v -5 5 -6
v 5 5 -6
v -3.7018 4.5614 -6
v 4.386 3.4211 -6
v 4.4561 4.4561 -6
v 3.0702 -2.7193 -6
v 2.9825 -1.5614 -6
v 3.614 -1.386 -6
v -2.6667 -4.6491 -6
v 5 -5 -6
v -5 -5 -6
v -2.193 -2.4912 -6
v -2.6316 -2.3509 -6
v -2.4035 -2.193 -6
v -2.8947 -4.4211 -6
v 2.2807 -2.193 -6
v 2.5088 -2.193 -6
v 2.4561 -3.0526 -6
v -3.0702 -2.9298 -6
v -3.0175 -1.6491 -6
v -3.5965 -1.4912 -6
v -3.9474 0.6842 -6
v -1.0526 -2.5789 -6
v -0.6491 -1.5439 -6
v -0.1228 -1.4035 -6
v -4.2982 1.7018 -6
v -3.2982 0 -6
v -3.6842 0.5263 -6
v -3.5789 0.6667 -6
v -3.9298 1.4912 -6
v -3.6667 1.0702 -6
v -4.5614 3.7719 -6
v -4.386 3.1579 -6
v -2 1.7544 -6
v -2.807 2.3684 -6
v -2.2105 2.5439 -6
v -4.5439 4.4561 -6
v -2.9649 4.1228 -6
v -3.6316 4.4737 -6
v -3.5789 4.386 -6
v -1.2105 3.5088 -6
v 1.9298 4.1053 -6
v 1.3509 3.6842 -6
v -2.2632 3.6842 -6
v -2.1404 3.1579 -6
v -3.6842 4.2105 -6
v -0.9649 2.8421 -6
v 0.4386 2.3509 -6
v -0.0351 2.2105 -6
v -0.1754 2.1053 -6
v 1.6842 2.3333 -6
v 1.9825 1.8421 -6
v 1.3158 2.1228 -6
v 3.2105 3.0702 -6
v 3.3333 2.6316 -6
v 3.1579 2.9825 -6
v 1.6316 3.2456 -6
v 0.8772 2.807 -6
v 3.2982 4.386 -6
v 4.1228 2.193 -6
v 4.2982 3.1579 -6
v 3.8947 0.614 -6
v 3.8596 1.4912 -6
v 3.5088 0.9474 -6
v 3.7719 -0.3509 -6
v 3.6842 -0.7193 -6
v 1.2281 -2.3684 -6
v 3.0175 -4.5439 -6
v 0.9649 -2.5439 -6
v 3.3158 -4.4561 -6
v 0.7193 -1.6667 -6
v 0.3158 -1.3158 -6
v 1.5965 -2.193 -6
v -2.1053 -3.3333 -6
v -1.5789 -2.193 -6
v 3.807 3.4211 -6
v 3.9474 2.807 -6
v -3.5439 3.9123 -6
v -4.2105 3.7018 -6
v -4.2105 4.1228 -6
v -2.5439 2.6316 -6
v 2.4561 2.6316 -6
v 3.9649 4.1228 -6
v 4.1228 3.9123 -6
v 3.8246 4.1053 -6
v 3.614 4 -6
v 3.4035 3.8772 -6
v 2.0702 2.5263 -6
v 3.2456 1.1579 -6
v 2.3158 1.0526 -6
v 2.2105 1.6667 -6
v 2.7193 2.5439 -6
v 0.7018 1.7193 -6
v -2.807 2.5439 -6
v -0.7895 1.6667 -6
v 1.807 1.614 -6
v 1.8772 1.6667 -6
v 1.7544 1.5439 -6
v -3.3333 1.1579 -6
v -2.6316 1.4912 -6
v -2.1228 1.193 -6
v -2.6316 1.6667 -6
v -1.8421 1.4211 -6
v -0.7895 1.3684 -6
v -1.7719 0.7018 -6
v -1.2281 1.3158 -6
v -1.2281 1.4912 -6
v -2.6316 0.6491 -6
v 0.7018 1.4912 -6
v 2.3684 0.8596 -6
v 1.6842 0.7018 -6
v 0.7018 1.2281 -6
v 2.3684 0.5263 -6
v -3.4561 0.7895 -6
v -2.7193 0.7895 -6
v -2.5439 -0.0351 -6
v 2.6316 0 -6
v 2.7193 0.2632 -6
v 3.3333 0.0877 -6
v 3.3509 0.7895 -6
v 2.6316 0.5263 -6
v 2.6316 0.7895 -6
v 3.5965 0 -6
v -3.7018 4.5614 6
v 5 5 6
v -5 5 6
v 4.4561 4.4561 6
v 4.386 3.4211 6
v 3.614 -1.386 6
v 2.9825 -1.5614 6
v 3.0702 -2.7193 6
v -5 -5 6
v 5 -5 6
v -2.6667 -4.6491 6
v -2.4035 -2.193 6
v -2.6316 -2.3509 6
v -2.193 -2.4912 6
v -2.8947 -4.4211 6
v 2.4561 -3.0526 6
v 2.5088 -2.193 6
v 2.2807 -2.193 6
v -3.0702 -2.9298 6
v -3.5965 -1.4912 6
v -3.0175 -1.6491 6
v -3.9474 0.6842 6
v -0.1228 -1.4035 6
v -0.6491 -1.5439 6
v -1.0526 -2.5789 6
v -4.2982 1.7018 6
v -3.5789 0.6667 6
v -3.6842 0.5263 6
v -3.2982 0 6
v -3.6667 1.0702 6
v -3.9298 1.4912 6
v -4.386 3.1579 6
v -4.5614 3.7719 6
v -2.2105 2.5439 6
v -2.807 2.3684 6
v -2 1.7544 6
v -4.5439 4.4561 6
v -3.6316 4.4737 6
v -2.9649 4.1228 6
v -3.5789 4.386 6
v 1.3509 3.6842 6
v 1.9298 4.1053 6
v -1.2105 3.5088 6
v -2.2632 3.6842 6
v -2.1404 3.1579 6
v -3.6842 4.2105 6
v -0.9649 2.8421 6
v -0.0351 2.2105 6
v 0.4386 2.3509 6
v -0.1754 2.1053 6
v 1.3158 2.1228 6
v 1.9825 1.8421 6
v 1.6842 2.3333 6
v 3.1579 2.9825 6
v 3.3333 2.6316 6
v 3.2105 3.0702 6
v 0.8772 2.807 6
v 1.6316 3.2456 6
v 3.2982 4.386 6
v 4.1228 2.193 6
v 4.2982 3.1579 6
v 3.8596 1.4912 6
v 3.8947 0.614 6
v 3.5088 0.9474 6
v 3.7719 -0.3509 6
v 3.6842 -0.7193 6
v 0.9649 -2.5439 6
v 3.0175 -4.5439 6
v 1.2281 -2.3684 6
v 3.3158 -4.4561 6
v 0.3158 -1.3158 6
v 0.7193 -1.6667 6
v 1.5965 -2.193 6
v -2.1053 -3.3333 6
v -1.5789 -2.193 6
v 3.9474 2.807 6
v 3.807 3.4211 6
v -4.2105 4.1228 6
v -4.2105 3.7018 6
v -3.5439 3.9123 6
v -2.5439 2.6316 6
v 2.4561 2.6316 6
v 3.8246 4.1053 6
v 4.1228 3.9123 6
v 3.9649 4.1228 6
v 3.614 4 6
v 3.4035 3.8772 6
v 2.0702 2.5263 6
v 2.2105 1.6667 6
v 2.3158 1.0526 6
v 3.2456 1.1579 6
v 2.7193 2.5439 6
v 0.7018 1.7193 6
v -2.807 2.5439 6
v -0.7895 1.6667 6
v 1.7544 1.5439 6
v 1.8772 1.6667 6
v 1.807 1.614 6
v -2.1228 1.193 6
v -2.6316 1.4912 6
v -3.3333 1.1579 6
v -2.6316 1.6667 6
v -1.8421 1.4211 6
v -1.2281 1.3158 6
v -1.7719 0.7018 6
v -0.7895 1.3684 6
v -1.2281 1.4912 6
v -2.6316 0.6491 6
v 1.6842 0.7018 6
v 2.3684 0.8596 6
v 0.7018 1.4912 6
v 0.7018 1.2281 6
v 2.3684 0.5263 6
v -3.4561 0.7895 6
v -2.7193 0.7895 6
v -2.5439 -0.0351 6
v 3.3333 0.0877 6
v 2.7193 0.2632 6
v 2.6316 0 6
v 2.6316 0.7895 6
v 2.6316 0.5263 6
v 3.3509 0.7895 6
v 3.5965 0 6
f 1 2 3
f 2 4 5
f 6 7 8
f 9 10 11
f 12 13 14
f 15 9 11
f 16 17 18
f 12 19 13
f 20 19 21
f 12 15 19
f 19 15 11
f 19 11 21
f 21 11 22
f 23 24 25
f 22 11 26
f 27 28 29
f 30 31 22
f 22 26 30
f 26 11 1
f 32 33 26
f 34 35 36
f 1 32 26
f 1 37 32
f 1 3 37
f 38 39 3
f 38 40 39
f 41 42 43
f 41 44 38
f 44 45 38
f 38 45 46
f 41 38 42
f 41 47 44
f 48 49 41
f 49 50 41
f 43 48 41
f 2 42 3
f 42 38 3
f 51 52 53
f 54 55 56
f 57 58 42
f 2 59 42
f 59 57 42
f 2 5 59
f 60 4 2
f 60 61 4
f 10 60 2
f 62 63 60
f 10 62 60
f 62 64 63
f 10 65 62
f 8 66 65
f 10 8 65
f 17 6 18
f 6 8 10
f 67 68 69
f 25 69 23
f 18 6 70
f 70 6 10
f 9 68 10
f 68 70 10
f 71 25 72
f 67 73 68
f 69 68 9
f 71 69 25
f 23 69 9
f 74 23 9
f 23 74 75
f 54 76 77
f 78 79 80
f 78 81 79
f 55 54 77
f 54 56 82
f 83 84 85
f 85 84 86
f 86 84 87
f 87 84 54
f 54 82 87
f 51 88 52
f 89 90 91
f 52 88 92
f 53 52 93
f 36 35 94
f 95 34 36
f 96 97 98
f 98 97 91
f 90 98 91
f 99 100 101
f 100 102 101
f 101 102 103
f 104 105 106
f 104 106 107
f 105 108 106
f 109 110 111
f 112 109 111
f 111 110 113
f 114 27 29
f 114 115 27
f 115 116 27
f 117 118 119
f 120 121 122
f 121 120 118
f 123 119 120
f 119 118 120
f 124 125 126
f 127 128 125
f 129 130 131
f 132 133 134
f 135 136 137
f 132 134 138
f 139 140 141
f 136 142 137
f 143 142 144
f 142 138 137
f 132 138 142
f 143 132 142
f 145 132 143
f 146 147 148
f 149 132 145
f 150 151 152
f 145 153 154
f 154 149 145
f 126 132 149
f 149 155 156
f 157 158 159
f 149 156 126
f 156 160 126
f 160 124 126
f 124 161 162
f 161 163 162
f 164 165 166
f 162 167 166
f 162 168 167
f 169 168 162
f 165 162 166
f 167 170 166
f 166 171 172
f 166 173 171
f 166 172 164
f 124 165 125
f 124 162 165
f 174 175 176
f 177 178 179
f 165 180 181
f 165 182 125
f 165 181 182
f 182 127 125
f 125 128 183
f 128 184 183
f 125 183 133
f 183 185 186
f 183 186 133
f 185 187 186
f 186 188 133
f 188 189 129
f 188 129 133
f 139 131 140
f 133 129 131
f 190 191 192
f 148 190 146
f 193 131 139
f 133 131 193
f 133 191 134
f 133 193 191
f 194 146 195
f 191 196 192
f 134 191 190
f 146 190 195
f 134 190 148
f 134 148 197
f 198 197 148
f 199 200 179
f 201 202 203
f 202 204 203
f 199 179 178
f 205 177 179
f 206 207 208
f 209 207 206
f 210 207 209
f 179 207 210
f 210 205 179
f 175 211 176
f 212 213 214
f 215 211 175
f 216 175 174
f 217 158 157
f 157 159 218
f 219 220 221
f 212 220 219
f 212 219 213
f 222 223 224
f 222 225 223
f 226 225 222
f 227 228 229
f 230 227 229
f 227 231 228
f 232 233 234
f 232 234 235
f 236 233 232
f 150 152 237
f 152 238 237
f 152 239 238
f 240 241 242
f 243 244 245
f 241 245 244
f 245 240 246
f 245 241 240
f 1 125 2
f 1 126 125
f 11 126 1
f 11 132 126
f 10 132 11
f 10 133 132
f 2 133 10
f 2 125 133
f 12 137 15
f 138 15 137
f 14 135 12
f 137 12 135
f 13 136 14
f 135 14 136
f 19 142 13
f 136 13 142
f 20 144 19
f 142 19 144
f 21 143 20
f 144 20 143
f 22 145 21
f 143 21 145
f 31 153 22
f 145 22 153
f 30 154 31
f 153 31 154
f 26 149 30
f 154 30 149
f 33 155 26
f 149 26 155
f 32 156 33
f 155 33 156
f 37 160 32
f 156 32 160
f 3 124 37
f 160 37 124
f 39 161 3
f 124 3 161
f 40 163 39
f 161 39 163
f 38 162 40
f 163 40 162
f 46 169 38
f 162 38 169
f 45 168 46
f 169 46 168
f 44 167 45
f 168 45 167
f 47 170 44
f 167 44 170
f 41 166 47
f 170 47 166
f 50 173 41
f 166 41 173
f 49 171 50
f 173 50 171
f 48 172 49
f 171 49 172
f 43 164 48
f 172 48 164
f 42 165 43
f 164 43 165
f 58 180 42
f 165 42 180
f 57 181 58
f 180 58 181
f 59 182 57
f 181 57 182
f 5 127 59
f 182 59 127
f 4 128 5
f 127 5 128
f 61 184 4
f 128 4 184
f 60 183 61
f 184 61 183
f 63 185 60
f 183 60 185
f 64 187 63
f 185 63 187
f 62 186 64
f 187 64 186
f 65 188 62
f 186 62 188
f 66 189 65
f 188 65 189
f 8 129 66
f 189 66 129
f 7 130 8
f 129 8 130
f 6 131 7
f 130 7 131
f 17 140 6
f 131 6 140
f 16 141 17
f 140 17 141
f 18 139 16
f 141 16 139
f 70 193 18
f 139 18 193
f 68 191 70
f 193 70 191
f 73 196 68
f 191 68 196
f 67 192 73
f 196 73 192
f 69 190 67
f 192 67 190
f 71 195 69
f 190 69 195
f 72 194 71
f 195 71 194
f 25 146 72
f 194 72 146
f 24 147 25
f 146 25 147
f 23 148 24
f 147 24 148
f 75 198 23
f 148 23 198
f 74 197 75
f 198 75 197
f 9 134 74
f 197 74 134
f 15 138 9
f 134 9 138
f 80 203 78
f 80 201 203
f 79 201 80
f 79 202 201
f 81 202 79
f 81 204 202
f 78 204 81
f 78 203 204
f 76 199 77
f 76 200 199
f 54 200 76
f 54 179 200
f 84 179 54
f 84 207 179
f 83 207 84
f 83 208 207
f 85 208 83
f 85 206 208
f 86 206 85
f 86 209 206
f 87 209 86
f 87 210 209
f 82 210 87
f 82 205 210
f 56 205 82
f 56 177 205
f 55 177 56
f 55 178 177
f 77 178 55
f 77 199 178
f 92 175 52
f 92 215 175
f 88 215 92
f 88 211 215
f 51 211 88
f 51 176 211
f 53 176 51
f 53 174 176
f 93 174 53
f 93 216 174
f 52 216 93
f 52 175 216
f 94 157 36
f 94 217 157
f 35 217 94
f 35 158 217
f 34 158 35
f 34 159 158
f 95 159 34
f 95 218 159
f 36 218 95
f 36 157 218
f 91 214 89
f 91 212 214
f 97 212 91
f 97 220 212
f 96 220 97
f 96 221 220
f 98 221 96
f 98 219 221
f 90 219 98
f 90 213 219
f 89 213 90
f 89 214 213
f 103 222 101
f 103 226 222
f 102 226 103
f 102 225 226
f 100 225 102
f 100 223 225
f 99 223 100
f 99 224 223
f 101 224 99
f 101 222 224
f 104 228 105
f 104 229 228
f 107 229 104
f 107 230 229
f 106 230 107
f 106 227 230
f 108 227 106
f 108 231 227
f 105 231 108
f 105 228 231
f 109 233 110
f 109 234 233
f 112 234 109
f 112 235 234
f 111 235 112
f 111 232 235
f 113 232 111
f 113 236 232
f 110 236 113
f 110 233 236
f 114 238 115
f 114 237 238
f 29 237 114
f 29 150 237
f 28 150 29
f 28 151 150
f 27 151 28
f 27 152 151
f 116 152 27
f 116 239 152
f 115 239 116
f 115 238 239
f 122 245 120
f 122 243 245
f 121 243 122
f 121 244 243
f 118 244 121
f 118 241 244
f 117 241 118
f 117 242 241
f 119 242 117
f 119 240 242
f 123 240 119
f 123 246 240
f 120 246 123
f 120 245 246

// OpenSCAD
module bflya_1()
{
 /* Generated by trace2scad version 20150415
    http://aggregate.org/MAKE/TRACE2SCAD/
    Optimized model has 5/9 original points
 */
 color([0.95, 0.95, 0.95])
 assign(minx=0) /* polygon minx=0 */
 assign(miny=0) /* polygon miny=0 */
 assign(maxx=20000) /* polygon maxx=20000 */
 assign(maxy=20000) /* polygon maxy=20000 */
 assign(dx=maxx-minx)
 assign(dy=maxy-miny)
 assign(maxd=((dx>dy)?dx:dy))
 scale([1/maxd, 1/maxd, 1])
 translate([-minx-dx/2, -miny-dy/2, 0])
 linear_extrude(height=1, convexity=5)
 union() {
  polygon([[0,10000],[0,0],[20000,0],[20000,20000],[0,20000]], convexity=5);
 }
}

module bflya_2()
{
 /* Generated by trace2scad version 20150415
    http://aggregate.org/MAKE/TRACE2SCAD/
    Optimized model has 5/9 original points
 */
 color([0.85, 0.85, 0.85])
 assign(minx=0) /* polygon minx=0 */
 assign(miny=0) /* polygon miny=0 */
 assign(maxx=20000) /* polygon maxx=20000 */
 assign(maxy=20000) /* polygon maxy=20000 */
 assign(dx=maxx-minx)
 assign(dy=maxy-miny)
 assign(maxd=((dx>dy)?dx:dy))
 scale([1/maxd, 1/maxd, 1])
 translate([-minx-dx/2, -miny-dy/2, 0])
 linear_extrude(height=1, convexity=5)
 union() {
  polygon([[0,10000],[0,0],[20000,0],[20000,20000],[0,20000]], convexity=5);
 }
}

module bflya_3()
{
 /* Generated by trace2scad version 20150415
    http://aggregate.org/MAKE/TRACE2SCAD/
    Optimized model has 5/9 original points
 */
 color([0.75, 0.75, 0.75])
 assign(minx=0) /* polygon minx=0 */
 assign(miny=0) /* polygon miny=0 */
 assign(maxx=20000) /* polygon maxx=20000 */
 assign(maxy=20000) /* polygon maxy=20000 */
 assign(dx=maxx-minx)
 assign(dy=maxy-miny)
 assign(maxd=((dx>dy)?dx:dy))
 scale([1/maxd, 1/maxd, 1])
 translate([-minx-dx/2, -miny-dy/2, 0])
 linear_extrude(height=1, convexity=5)
 union() {
  polygon([[0,10000],[0,0],[20000,0],[20000,20000],[0,20000]], convexity=5);
 }
}

module bflya_4()
{
 /* Generated by trace2scad version 20150415
    http://aggregate.org/MAKE/TRACE2SCAD/
    Optimized model has 5/9 original points
 */
 color([0.65, 0.65, 0.65])
 assign(minx=0) /* polygon minx=0 */
 assign(miny=0) /* polygon miny=0 */
 assign(maxx=20000) /* polygon maxx=20000 */
 assign(maxy=20000) /* polygon maxy=20000 */
 assign(dx=maxx-minx)
 assign(dy=maxy-miny)
 assign(maxd=((dx>dy)?dx:dy))
 scale([1/maxd, 1/maxd, 1])
 translate([-minx-dx/2, -miny-dy/2, 0])
 linear_extrude(height=1, convexity=5)
 union() {
  polygon([[0,10000],[0,0],[20000,0],[20000,20000],[0,20000]], convexity=5);
 }
}

module bflya_5()
{
 /* Generated by trace2scad version 20150415
    http://aggregate.org/MAKE/TRACE2SCAD/
    Optimized model has 5/9 original points
 */
 color([0.55, 0.55, 0.55])
 assign(minx=0) /* polygon minx=0 */
 assign(miny=0) /* polygon miny=0 */
 assign(maxx=20000) /* polygon maxx=20000 */
 assign(maxy=20000) /* polygon maxy=20000 */
 assign(dx=maxx-minx)
 assign(dy=maxy-miny)
 assign(maxd=((dx>dy)?dx:dy))
 scale([1/maxd, 1/maxd, 1])
 translate([-minx-dx/2, -miny-dy/2, 0])
 linear_extrude(height=1, convexity=5)
 union() {
  polygon([[0,10000],[0,0],[20000,0],[20000,20000],[0,20000]], convexity=5);
 }
}

module bflya_6()
{
 /* Generated by trace2scad version 20150415
    http://aggregate.org/MAKE/TRACE2SCAD/
    Optimized model has 5/9 original points
 */
 color([0.45, 0.45, 0.45])
 assign(minx=0) /* polygon minx=0 */
 assign(miny=0) /* polygon miny=0 */
 assign(maxx=20000) /* polygon maxx=20000 */
 assign(maxy=20000) /* polygon maxy=20000 */
 assign(dx=maxx-minx)
 assign(dy=maxy-miny)
 assign(maxd=((dx>dy)?dx:dy))
 scale([1/maxd, 1/maxd, 1])
 translate([-minx-dx/2, -miny-dy/2, 0])
 linear_extrude(height=1, convexity=5)
 union() {
  polygon([[0,10000],[0,0],[20000,0],[20000,20000],[0,20000]], convexity=5);
 }
}

module bflya_7()
{
 /* Generated by trace2scad version 20150415
    http://aggregate.org/MAKE/TRACE2SCAD/
    Optimized model has 5/9 original points
 */
 color([0.35, 0.35, 0.35])
 assign(minx=0) /* polygon minx=0 */
 assign(miny=0) /* polygon miny=0 */
 assign(maxx=20000) /* polygon maxx=20000 */
 assign(maxy=20000) /* polygon maxy=20000 */
 assign(dx=maxx-minx)
 assign(dy=maxy-miny)
 assign(maxd=((dx>dy)?dx:dy))
 scale([1/maxd, 1/maxd, 1])
 translate([-minx-dx/2, -miny-dy/2, 0])
 linear_extrude(height=1, convexity=5)
 union() {
  polygon([[0,10000],[0,0],[20000,0],[20000,20000],[0,20000]], convexity=5);
 }
}

module bflya_8()
{
 /* Generated by trace2scad version 20150415
    http://aggregate.org/MAKE/TRACE2SCAD/
    Optimized model has 5/9 original points
 */
 color([0.25, 0.25, 0.25])
 assign(minx=0) /* polygon minx=0 */
 assign(miny=0) /* polygon miny=0 */
 assign(maxx=20000) /* polygon maxx=20000 */
 assign(maxy=20000) /* polygon maxy=20000 */
 assign(dx=maxx-minx)
 assign(dy=maxy-miny)
 assign(maxd=((dx>dy)?dx:dy))
 scale([1/maxd, 1/maxd, 1])
 translate([-minx-dx/2, -miny-dy/2, 0])
 linear_extrude(height=1, convexity=5)
 union() {
  polygon([[0,10000],[0,0],[20000,0],[20000,20000],[0,20000]], convexity=5);
 }
}

module bflya_9()
{
 /* Generated by trace2scad version 20150415
    http://aggregate.org/MAKE/TRACE2SCAD/
    Optimized model has 130/600 original points
 */
 color([0.15, 0.15, 0.15])
 assign(minx=0) /* polygon minx=0 */
 assign(miny=0) /* polygon miny=0 */
 assign(maxx=570) /* polygon maxx=570 */
 assign(maxy=570) /* polygon maxy=570 */
 assign(dx=maxx-minx)
 assign(dy=maxy-miny)
 assign(maxd=((dx>dy)?dx:dy))
 scale([1/maxd, 1/maxd, 1])
 translate([-minx-dx/2, -miny-dy/2, 0])
 linear_extrude(height=1, convexity=130)
 union() {
  union() {
   union() {
    difference() {
     polygon([[0,285],[0,0],[570,0],[570,570],[0,570]], convexity=5);
     polygon([[78,540],[81,535],[116,520],[75,525],[163,465],[156,495],[230,447],[216,485],[275,405],[283,411],[310,419],[362,495],[395,519],[335,445],[378,470],[473,535],[539,539],[535,480],[530,465],[520,410],[505,370],[485,339],[507,320],[500,265],[495,244],[491,206],[455,196],[460,130],[428,160],[415,160],[425,111],[474,31],[457,26],[376,160],[355,150],[340,140],[326,190],[303,210],[278,205],[248,197],[225,138],[195,160],[165,95],[133,20],[120,33],[160,143],[148,160],[135,151],[110,118],[113,191],[80,200],[60,324],[76,346],[61,370],[40,382],[35,465],[25,500],[26,539],[74,545]], convexity=34);
    }
    polygon([[45,508],[45,496],[140,435],[83,508],[45,520]], convexity=4);
    polygon([[491,513],[479,506],[425,435],[465,455],[475,435],[510,445],[502,480],[468,460],[520,508],[511,520],[503,519]], convexity=11);
    polygon([[125,425],[125,420],[171,385],[240,380],[159,430],[125,430]], convexity=4);
    polygon([[381,418],[360,406],[325,383],[398,390],[440,430],[403,429]], convexity=5);
    polygon([[135,375],[135,370],[95,351],[164,353],[180,366],[135,380]], convexity=6);
    polygon([[388,377],[385,373],[417,345],[470,351],[411,380],[392,380]], convexity=6);
    polygon([[215,365],[215,360],[135,322],[184,325],[240,363],[215,370]], convexity=6);
    polygon([[325,363],[325,355],[381,325],[420,315],[420,334],[325,370]], convexity=5);
    polygon([[81,323],[75,315],[97,285],[140,283],[130,330],[88,330]], convexity=5);
    polygon([[435,323],[435,315],[440,300],[435,285],[475,290],[490,285],[476,330],[435,330]], convexity=7);
   }
  }
 }
}

module bflya_10()
{
 /* Generated by trace2scad version 20150415
    http://aggregate.org/MAKE/TRACE2SCAD/
    Optimized model has 180/785 original points
 */
 color([0.05, 0.05, 0.05])
 assign(minx=0) /* polygon minx=0 */
 assign(miny=0) /* polygon miny=0 */
 assign(maxx=900) /* polygon maxx=900 */
 assign(maxy=900) /* polygon maxy=900 */
 assign(dx=maxx-minx)
 assign(dy=maxy-miny)
 assign(maxd=((dx>dy)?dx:dy))
 scale([1/maxd, 1/maxd, 1])
 translate([-minx-dx/2, -miny-dy/2, 0])
 linear_extrude(height=1, convexity=180)
 union() {
  union() {
   union() {
    difference() {
     polygon([[0,450],[0,0],[900,0],[900,900],[0,900]], convexity=5);
     polygon([[828,865],[831,860],[870,843],[849,761],[844,740],[840,661],[813,585],[771,541],[800,497],[790,435],[801,393],[769,354],[780,310],[753,314],[742,325],[720,279],[742,215],[711,198],[667,250],[670,182],[738,92],[748,38],[710,47],[615,212],[583,245],[560,224],[545,224],[485,327],[462,324],[433,324],[413,329],[353,215],[335,246],[308,243],[215,37],[194,33],[195,88],[245,225],[231,255],[181,184],[165,202],[185,278],[155,316],[118,308],[123,377],[95,404],[100,478],[95,513],[125,542],[65,602],[50,698],[46,767],[25,842],[42,860],[138,860],[283,770],[355,710],[305,774],[255,827],[262,850],[363,751],[427,650],[454,656],[493,683],[564,788],[619,839],[631,816],[530,696],[731,847],[824,870]], convexity=45);
    }
    polygon([[81,806],[83,788],[217,700],[109,810],[79,825]], convexity=4);
    polygon([[155,808],[172,790],[267,740],[174,812],[138,825]], convexity=4);
    polygon([[731,818],[720,812],[623,730],[740,808],[750,825],[743,824]], convexity=5);
    polygon([[790,812],[768,801],[684,700],[815,790],[813,824]], convexity=5);
    polygon([[792,748],[781,742],[739,700],[800,715],[808,749],[803,753]], convexity=5);
    polygon([[218,655],[238,634],[339,610],[360,614],[248,675],[198,675]], convexity=5);
    polygon([[648,670],[644,665],[518,601],[658,634],[697,675],[651,675]], convexity=5);
    polygon([[128,630],[124,625],[100,618],[135,588],[205,616],[154,635],[131,635]], convexity=6);
    polygon([[701,628],[690,623],[744,589],[797,625],[713,634]], convexity=6);
    polygon([[228,590],[224,585],[160,569],[172,550],[228,550],[298,585],[231,595]], convexity=6);
    polygon([[638,590],[634,585],[612,580],[697,550],[735,564],[658,595],[641,595]], convexity=6);
    polygon([[323,565],[313,555],[230,516],[284,518],[378,574],[332,575]], convexity=5);
    polygon([[528,570],[539,566],[646,510],[665,516],[536,575],[518,574]], convexity=6);
    polygon([[141,508],[130,503],[130,460],[211,456],[193,515],[153,514]], convexity=6);
    polygon([[700,508],[700,501],[701,464],[658,452],[724,461],[745,466],[765,460],[765,503],[700,515]], convexity=8);
    polygon([[480,438],[480,381],[495,369],[505,403],[485,432],[527,460],[480,495]], convexity=7);
    polygon([[709,407],[708,388],[669,384],[733,360],[748,410],[711,426]], convexity=6);
   }
  }
 }
}

module bflya()
{
 /* all layers combined, scaled to within a 1mm cube */
 scale([1, 1, 1/10])
 difference() {
  union() {
   scale([1,1,2]) translate([0,0,-0.5]) bflya_1();
   scale([1,1,4]) translate([0,0,-0.5]) bflya_2();
   scale([1,1,6]) translate([0,0,-0.5]) bflya_3();
   scale([1,1,8]) translate([0,0,-0.5]) bflya_4();
   scale([1,1,10]) translate([0,0,-0.5]) bflya_5();
   scale([1,1,12]) translate([0,0,-0.5]) bflya_6();
   scale([1,1,14]) translate([0,0,-0.5]) bflya_7();
   scale([1,1,16]) translate([0,0,-0.5]) bflya_8();
   scale([1,1,18]) translate([0,0,-0.5]) bflya_9();
   scale([1,1,20]) translate([0,0,-0.5]) bflya_10();
  }
  translate([0,0,-11]) cube([2,2,22],center=true);
 }
}

scale([10,10,1])
   scale([1,1,12]) translate([0,0,-0.5]) bflya_9();
